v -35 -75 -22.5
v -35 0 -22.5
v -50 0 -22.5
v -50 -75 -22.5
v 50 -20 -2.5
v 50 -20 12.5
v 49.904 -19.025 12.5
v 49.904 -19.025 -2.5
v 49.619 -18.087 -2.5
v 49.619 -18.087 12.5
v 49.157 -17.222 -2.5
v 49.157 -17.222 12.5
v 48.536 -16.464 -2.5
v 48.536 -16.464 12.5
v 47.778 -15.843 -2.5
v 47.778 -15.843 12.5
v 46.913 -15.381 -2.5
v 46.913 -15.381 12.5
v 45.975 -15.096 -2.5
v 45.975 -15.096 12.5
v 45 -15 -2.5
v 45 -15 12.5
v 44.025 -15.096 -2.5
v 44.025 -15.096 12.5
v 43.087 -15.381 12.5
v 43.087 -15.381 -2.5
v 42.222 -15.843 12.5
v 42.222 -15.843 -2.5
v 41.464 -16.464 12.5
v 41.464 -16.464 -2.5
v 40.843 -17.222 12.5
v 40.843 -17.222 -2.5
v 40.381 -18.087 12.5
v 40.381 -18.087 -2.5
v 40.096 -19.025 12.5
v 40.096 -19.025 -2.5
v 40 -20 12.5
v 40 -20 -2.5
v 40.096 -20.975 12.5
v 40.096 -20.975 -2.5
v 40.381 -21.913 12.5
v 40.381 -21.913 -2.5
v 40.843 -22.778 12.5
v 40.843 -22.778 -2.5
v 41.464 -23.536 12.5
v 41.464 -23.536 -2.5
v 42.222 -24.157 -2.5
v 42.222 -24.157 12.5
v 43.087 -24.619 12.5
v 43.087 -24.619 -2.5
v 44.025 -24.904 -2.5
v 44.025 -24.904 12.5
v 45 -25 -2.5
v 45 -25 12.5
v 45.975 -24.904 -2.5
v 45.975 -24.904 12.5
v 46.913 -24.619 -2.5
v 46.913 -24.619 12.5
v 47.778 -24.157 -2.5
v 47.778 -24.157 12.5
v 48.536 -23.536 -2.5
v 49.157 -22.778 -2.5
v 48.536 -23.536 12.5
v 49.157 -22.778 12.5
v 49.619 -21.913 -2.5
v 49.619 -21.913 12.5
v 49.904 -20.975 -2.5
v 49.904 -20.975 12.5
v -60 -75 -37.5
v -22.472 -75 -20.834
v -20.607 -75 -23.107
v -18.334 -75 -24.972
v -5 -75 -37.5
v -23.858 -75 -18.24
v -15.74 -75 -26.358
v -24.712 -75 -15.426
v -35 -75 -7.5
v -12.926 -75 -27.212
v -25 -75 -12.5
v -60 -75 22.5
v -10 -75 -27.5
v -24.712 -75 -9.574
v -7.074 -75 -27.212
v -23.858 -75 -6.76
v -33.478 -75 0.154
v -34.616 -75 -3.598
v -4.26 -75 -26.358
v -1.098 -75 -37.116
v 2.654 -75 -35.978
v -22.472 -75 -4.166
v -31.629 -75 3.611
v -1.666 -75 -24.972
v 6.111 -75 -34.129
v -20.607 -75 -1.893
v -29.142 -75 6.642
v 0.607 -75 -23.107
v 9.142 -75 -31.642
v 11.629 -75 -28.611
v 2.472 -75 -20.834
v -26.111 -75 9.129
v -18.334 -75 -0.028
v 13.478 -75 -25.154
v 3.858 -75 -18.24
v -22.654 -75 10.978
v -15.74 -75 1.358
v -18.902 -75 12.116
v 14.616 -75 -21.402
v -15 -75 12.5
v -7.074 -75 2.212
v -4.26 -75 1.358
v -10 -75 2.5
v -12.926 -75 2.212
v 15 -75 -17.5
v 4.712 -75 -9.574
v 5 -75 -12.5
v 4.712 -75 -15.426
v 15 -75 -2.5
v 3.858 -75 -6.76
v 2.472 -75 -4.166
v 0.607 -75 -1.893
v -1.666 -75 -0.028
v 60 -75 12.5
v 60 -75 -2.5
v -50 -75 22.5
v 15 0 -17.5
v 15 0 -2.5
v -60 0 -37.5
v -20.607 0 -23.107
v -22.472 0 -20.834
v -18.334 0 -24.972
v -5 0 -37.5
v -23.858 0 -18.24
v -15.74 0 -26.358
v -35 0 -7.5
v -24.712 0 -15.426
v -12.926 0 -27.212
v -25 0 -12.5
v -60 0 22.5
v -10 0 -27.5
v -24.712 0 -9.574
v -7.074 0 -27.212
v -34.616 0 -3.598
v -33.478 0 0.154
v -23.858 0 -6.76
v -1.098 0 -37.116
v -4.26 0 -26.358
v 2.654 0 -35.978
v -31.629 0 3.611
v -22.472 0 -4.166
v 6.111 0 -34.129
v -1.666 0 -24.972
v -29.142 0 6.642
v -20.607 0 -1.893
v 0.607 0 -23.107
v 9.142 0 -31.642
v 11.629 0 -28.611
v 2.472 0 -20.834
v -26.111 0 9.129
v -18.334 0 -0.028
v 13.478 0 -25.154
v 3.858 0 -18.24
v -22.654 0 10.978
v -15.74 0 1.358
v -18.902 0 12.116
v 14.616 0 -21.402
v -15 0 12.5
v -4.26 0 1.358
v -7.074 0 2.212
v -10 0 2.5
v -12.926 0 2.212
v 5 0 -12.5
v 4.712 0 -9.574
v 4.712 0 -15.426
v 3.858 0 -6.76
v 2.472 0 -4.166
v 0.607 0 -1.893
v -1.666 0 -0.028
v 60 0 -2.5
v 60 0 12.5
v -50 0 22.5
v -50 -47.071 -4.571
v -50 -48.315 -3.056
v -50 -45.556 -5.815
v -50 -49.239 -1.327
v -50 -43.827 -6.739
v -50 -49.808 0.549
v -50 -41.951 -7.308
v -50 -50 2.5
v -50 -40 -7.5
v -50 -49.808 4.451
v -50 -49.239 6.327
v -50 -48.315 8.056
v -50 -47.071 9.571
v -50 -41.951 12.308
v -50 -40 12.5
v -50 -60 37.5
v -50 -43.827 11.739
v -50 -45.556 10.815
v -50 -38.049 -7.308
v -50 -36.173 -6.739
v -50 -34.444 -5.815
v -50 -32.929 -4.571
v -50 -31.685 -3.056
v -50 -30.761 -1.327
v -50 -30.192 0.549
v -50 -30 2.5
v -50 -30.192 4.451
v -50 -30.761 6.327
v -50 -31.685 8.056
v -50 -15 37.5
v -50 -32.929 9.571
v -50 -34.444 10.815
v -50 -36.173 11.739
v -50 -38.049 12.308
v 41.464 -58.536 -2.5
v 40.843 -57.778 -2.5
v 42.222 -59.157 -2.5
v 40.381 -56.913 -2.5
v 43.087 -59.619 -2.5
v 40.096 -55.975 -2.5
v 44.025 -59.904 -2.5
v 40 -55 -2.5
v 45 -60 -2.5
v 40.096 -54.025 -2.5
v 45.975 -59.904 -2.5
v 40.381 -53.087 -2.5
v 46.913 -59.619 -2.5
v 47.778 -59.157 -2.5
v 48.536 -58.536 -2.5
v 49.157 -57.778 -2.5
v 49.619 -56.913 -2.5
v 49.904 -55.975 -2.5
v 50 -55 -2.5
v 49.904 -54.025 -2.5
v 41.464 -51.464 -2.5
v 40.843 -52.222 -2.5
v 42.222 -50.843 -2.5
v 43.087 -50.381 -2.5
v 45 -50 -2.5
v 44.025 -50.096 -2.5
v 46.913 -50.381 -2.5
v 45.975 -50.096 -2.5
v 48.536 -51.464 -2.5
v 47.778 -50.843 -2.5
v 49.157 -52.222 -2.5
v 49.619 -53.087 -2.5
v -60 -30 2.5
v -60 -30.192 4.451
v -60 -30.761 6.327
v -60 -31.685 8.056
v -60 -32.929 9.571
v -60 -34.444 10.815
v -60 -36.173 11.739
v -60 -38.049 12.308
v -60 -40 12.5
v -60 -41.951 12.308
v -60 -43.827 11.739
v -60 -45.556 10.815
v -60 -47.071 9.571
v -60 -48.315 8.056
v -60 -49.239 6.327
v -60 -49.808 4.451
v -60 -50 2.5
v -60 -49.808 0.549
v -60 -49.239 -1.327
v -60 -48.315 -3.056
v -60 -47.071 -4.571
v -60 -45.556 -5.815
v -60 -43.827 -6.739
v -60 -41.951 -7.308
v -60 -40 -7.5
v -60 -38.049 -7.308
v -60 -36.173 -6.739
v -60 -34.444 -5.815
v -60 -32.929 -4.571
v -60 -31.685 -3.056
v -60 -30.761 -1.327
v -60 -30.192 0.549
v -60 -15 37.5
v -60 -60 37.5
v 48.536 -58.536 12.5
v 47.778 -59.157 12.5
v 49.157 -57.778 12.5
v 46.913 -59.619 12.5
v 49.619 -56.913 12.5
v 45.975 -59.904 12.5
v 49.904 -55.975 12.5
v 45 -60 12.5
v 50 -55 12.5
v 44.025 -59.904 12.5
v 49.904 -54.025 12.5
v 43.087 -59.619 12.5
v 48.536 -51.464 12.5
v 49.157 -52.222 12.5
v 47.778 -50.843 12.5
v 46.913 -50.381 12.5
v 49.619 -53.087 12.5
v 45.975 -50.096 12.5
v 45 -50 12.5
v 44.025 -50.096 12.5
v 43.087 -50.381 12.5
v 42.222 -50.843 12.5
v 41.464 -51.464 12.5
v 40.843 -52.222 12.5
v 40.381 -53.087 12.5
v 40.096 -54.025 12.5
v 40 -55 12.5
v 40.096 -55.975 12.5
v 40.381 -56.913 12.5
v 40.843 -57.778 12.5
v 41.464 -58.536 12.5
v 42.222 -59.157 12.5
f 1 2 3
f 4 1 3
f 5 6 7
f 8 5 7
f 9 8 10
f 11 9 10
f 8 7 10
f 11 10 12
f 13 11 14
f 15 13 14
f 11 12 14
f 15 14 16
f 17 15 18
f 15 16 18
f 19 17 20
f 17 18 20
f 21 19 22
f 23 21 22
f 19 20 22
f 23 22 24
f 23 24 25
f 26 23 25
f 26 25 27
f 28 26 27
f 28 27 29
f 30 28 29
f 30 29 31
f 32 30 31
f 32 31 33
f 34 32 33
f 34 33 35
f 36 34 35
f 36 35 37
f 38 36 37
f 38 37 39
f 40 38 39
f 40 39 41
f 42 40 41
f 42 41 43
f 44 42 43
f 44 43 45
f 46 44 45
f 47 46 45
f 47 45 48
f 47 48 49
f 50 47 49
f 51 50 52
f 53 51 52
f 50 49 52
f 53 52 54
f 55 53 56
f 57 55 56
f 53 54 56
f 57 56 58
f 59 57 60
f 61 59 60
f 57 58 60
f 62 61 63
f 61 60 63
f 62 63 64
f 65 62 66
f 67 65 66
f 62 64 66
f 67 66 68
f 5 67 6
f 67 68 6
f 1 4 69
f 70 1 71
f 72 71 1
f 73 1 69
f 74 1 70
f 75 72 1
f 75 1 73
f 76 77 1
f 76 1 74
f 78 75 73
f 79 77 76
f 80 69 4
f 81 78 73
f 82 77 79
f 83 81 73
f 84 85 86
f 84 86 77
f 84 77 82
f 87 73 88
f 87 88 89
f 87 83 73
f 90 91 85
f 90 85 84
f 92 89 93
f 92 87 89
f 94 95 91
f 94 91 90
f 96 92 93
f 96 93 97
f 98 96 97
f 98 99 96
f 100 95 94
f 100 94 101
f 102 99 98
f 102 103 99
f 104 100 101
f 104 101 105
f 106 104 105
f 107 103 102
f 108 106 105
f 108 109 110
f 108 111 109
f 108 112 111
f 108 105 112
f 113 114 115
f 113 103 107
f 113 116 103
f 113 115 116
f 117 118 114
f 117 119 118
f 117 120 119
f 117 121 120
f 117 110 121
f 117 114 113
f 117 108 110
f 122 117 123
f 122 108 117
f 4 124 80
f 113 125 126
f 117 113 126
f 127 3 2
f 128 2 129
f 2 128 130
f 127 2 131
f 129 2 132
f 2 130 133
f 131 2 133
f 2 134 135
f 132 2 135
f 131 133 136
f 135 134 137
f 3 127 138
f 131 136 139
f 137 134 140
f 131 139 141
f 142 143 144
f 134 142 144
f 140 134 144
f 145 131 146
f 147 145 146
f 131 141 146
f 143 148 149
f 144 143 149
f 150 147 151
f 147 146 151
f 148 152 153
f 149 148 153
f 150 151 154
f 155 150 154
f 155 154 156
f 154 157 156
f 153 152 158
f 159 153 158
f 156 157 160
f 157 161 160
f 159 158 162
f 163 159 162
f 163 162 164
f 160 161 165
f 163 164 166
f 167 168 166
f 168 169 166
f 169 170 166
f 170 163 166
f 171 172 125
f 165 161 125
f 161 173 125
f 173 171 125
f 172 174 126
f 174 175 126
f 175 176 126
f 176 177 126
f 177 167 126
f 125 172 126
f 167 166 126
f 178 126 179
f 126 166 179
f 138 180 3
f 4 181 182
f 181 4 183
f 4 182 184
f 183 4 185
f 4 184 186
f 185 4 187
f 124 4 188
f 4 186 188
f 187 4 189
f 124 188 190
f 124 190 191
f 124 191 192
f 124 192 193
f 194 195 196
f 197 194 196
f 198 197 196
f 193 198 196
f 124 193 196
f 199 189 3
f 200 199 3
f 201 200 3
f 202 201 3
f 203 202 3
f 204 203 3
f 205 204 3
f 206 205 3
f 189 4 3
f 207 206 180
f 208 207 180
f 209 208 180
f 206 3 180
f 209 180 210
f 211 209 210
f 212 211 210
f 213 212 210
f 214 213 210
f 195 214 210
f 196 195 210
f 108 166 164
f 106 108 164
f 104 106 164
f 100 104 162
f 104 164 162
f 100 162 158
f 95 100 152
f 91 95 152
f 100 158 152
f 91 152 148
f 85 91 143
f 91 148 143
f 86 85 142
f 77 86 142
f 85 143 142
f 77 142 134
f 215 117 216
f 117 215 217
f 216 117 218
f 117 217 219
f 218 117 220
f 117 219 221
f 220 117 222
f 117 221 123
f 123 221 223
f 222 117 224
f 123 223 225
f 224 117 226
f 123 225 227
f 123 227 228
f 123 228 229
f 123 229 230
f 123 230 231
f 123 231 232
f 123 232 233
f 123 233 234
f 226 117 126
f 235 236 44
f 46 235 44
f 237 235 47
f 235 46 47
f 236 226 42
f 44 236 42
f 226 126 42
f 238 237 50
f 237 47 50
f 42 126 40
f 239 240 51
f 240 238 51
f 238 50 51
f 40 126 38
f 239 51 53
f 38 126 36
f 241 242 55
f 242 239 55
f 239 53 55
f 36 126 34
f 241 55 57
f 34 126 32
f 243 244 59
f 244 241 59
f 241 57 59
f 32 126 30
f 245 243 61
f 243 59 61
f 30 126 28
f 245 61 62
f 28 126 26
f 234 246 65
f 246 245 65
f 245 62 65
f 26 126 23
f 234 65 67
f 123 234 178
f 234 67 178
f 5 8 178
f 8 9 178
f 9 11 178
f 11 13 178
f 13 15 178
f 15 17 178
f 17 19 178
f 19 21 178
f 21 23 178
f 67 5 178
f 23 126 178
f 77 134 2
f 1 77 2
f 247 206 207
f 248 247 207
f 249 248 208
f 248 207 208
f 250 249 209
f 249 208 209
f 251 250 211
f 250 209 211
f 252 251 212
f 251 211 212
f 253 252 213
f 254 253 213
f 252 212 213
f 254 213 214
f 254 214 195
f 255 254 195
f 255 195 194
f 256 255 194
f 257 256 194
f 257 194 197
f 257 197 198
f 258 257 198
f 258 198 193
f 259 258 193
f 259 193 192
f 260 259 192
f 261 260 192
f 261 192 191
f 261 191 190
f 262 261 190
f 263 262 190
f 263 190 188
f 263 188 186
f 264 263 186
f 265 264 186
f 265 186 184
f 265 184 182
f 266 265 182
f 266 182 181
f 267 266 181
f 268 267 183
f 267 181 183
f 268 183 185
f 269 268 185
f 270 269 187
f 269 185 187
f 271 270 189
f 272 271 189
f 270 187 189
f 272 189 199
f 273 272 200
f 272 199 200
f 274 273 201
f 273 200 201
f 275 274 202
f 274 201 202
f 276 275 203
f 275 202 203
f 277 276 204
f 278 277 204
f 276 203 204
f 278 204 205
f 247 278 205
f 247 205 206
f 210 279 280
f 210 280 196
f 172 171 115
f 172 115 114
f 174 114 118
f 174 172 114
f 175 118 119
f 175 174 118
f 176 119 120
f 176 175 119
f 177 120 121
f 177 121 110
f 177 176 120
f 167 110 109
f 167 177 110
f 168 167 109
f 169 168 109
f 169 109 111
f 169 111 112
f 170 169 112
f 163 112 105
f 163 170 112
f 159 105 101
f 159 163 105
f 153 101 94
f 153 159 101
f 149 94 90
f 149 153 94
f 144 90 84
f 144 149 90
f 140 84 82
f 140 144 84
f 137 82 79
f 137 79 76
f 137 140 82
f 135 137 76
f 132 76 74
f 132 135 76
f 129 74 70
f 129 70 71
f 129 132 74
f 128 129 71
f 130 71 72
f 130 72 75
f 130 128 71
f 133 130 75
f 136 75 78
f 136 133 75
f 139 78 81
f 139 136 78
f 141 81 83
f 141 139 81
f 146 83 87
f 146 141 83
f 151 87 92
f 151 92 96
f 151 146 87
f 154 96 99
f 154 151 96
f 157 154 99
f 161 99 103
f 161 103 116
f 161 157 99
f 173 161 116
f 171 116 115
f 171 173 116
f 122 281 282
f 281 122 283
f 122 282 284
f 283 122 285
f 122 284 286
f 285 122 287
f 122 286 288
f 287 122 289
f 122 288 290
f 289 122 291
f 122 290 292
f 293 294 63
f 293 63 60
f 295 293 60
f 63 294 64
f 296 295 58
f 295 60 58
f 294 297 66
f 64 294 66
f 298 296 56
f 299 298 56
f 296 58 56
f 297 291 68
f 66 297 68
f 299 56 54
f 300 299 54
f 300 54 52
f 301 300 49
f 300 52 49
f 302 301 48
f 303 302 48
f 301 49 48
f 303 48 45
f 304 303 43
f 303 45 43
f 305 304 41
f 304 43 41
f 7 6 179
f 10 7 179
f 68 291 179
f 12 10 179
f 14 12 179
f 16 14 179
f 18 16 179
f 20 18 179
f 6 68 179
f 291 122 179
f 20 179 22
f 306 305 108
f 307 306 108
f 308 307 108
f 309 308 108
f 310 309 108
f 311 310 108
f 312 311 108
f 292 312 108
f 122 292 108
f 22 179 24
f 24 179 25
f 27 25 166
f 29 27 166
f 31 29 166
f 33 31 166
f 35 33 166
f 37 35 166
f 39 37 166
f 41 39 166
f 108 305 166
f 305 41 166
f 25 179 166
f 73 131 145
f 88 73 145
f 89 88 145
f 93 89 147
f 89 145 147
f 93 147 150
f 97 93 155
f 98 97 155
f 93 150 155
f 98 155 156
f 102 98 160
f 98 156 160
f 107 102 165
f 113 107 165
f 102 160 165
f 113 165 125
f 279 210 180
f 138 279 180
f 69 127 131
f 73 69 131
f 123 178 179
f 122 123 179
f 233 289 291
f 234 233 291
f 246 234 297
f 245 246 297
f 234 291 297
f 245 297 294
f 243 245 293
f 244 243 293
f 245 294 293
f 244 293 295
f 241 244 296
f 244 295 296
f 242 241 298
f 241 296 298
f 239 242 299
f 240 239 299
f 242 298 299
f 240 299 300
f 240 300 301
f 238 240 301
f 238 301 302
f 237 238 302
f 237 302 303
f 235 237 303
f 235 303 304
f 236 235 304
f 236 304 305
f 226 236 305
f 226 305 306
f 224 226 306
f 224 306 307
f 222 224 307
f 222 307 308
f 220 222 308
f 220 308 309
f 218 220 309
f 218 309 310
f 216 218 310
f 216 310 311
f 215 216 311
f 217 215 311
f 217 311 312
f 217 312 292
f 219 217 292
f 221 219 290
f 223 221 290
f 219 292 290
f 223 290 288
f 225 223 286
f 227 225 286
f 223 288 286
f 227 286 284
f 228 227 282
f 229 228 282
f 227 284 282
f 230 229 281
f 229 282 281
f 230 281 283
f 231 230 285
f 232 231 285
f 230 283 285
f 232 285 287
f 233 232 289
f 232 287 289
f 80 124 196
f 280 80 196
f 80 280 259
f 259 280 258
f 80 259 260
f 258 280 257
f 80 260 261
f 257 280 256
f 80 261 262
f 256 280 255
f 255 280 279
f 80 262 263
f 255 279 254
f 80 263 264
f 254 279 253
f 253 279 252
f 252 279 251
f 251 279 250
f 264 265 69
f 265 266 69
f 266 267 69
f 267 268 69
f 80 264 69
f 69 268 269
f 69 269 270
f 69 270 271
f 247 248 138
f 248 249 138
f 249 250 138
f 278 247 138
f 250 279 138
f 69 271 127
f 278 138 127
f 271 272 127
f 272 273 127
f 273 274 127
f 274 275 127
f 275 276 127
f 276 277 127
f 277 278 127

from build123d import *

# Parameters (mm, degrees)
F0_R     = 15
F0_W     = 10
F0_H     = 15
F1_DEPTH = 75
F2_R     = 5
F3_DEPTH = 50.001
F4_R     = 10
F5_DEPTH = 10.001


with BuildPart() as f1:
    # F0 (on Front) → F1 (new body)
    with BuildSketch(Plane.XZ):
        with BuildLine():
            Line((60, -2.5), (60, 12.5))
            Line((60, 12.5), (-15, 12.5))
            ThreePointArc((-15, 12.5), (-29.142136, 6.642136), (-35, -7.5))
            Line((-35, -7.5), (-35, -22.5))
            Line((-35, -22.5), (-50, -22.5))
            Line((-50, -22.5), (-50, -37.5))
            Line((-50, -37.5), (-5, -37.5))
            ThreePointArc((-5, -37.5), (9.142136, -31.642136), (15, -17.5))
            Line((15, -17.5), (15, -2.5))
            Line((15, -2.5), (60, -2.5))
        make_face()
        with Locations((-10, -12.5)):
            Circle(F0_R, mode=Mode.SUBTRACT)
        Polygon((-50, -22.5), (-50, 22.5), (-60, 22.5), (-60, -37.5), (-50, -37.5), align=None)
        with Locations((-55, 30)):
            Rectangle(F0_W, F0_H)
    extrude(amount=F1_DEPTH)

    # F2 (on face) → F3 (cut, through all)
    with BuildSketch(Plane.XY.offset(12.5)):
        with Locations((45, -20)):
            Circle(F2_R)
        with Locations((45, -55)):
            Circle(F2_R)
    extrude(amount=-F3_DEPTH, mode=Mode.SUBTRACT)

    # F4 (on face) → F5 (cut, through all)
    with BuildSketch(Plane.YZ.offset(-50)):
        with Locations((-40, 2.5)):
            Circle(F4_R)
        Polygon((-75, 37.5), (-75, 22.5), (-60, 37.5), align=None)
        Polygon((0, 37.5), (-15, 37.5), (0, 22.5), align=None)
    extrude(amount=-F5_DEPTH, mode=Mode.SUBTRACT)


solid = f1.part
